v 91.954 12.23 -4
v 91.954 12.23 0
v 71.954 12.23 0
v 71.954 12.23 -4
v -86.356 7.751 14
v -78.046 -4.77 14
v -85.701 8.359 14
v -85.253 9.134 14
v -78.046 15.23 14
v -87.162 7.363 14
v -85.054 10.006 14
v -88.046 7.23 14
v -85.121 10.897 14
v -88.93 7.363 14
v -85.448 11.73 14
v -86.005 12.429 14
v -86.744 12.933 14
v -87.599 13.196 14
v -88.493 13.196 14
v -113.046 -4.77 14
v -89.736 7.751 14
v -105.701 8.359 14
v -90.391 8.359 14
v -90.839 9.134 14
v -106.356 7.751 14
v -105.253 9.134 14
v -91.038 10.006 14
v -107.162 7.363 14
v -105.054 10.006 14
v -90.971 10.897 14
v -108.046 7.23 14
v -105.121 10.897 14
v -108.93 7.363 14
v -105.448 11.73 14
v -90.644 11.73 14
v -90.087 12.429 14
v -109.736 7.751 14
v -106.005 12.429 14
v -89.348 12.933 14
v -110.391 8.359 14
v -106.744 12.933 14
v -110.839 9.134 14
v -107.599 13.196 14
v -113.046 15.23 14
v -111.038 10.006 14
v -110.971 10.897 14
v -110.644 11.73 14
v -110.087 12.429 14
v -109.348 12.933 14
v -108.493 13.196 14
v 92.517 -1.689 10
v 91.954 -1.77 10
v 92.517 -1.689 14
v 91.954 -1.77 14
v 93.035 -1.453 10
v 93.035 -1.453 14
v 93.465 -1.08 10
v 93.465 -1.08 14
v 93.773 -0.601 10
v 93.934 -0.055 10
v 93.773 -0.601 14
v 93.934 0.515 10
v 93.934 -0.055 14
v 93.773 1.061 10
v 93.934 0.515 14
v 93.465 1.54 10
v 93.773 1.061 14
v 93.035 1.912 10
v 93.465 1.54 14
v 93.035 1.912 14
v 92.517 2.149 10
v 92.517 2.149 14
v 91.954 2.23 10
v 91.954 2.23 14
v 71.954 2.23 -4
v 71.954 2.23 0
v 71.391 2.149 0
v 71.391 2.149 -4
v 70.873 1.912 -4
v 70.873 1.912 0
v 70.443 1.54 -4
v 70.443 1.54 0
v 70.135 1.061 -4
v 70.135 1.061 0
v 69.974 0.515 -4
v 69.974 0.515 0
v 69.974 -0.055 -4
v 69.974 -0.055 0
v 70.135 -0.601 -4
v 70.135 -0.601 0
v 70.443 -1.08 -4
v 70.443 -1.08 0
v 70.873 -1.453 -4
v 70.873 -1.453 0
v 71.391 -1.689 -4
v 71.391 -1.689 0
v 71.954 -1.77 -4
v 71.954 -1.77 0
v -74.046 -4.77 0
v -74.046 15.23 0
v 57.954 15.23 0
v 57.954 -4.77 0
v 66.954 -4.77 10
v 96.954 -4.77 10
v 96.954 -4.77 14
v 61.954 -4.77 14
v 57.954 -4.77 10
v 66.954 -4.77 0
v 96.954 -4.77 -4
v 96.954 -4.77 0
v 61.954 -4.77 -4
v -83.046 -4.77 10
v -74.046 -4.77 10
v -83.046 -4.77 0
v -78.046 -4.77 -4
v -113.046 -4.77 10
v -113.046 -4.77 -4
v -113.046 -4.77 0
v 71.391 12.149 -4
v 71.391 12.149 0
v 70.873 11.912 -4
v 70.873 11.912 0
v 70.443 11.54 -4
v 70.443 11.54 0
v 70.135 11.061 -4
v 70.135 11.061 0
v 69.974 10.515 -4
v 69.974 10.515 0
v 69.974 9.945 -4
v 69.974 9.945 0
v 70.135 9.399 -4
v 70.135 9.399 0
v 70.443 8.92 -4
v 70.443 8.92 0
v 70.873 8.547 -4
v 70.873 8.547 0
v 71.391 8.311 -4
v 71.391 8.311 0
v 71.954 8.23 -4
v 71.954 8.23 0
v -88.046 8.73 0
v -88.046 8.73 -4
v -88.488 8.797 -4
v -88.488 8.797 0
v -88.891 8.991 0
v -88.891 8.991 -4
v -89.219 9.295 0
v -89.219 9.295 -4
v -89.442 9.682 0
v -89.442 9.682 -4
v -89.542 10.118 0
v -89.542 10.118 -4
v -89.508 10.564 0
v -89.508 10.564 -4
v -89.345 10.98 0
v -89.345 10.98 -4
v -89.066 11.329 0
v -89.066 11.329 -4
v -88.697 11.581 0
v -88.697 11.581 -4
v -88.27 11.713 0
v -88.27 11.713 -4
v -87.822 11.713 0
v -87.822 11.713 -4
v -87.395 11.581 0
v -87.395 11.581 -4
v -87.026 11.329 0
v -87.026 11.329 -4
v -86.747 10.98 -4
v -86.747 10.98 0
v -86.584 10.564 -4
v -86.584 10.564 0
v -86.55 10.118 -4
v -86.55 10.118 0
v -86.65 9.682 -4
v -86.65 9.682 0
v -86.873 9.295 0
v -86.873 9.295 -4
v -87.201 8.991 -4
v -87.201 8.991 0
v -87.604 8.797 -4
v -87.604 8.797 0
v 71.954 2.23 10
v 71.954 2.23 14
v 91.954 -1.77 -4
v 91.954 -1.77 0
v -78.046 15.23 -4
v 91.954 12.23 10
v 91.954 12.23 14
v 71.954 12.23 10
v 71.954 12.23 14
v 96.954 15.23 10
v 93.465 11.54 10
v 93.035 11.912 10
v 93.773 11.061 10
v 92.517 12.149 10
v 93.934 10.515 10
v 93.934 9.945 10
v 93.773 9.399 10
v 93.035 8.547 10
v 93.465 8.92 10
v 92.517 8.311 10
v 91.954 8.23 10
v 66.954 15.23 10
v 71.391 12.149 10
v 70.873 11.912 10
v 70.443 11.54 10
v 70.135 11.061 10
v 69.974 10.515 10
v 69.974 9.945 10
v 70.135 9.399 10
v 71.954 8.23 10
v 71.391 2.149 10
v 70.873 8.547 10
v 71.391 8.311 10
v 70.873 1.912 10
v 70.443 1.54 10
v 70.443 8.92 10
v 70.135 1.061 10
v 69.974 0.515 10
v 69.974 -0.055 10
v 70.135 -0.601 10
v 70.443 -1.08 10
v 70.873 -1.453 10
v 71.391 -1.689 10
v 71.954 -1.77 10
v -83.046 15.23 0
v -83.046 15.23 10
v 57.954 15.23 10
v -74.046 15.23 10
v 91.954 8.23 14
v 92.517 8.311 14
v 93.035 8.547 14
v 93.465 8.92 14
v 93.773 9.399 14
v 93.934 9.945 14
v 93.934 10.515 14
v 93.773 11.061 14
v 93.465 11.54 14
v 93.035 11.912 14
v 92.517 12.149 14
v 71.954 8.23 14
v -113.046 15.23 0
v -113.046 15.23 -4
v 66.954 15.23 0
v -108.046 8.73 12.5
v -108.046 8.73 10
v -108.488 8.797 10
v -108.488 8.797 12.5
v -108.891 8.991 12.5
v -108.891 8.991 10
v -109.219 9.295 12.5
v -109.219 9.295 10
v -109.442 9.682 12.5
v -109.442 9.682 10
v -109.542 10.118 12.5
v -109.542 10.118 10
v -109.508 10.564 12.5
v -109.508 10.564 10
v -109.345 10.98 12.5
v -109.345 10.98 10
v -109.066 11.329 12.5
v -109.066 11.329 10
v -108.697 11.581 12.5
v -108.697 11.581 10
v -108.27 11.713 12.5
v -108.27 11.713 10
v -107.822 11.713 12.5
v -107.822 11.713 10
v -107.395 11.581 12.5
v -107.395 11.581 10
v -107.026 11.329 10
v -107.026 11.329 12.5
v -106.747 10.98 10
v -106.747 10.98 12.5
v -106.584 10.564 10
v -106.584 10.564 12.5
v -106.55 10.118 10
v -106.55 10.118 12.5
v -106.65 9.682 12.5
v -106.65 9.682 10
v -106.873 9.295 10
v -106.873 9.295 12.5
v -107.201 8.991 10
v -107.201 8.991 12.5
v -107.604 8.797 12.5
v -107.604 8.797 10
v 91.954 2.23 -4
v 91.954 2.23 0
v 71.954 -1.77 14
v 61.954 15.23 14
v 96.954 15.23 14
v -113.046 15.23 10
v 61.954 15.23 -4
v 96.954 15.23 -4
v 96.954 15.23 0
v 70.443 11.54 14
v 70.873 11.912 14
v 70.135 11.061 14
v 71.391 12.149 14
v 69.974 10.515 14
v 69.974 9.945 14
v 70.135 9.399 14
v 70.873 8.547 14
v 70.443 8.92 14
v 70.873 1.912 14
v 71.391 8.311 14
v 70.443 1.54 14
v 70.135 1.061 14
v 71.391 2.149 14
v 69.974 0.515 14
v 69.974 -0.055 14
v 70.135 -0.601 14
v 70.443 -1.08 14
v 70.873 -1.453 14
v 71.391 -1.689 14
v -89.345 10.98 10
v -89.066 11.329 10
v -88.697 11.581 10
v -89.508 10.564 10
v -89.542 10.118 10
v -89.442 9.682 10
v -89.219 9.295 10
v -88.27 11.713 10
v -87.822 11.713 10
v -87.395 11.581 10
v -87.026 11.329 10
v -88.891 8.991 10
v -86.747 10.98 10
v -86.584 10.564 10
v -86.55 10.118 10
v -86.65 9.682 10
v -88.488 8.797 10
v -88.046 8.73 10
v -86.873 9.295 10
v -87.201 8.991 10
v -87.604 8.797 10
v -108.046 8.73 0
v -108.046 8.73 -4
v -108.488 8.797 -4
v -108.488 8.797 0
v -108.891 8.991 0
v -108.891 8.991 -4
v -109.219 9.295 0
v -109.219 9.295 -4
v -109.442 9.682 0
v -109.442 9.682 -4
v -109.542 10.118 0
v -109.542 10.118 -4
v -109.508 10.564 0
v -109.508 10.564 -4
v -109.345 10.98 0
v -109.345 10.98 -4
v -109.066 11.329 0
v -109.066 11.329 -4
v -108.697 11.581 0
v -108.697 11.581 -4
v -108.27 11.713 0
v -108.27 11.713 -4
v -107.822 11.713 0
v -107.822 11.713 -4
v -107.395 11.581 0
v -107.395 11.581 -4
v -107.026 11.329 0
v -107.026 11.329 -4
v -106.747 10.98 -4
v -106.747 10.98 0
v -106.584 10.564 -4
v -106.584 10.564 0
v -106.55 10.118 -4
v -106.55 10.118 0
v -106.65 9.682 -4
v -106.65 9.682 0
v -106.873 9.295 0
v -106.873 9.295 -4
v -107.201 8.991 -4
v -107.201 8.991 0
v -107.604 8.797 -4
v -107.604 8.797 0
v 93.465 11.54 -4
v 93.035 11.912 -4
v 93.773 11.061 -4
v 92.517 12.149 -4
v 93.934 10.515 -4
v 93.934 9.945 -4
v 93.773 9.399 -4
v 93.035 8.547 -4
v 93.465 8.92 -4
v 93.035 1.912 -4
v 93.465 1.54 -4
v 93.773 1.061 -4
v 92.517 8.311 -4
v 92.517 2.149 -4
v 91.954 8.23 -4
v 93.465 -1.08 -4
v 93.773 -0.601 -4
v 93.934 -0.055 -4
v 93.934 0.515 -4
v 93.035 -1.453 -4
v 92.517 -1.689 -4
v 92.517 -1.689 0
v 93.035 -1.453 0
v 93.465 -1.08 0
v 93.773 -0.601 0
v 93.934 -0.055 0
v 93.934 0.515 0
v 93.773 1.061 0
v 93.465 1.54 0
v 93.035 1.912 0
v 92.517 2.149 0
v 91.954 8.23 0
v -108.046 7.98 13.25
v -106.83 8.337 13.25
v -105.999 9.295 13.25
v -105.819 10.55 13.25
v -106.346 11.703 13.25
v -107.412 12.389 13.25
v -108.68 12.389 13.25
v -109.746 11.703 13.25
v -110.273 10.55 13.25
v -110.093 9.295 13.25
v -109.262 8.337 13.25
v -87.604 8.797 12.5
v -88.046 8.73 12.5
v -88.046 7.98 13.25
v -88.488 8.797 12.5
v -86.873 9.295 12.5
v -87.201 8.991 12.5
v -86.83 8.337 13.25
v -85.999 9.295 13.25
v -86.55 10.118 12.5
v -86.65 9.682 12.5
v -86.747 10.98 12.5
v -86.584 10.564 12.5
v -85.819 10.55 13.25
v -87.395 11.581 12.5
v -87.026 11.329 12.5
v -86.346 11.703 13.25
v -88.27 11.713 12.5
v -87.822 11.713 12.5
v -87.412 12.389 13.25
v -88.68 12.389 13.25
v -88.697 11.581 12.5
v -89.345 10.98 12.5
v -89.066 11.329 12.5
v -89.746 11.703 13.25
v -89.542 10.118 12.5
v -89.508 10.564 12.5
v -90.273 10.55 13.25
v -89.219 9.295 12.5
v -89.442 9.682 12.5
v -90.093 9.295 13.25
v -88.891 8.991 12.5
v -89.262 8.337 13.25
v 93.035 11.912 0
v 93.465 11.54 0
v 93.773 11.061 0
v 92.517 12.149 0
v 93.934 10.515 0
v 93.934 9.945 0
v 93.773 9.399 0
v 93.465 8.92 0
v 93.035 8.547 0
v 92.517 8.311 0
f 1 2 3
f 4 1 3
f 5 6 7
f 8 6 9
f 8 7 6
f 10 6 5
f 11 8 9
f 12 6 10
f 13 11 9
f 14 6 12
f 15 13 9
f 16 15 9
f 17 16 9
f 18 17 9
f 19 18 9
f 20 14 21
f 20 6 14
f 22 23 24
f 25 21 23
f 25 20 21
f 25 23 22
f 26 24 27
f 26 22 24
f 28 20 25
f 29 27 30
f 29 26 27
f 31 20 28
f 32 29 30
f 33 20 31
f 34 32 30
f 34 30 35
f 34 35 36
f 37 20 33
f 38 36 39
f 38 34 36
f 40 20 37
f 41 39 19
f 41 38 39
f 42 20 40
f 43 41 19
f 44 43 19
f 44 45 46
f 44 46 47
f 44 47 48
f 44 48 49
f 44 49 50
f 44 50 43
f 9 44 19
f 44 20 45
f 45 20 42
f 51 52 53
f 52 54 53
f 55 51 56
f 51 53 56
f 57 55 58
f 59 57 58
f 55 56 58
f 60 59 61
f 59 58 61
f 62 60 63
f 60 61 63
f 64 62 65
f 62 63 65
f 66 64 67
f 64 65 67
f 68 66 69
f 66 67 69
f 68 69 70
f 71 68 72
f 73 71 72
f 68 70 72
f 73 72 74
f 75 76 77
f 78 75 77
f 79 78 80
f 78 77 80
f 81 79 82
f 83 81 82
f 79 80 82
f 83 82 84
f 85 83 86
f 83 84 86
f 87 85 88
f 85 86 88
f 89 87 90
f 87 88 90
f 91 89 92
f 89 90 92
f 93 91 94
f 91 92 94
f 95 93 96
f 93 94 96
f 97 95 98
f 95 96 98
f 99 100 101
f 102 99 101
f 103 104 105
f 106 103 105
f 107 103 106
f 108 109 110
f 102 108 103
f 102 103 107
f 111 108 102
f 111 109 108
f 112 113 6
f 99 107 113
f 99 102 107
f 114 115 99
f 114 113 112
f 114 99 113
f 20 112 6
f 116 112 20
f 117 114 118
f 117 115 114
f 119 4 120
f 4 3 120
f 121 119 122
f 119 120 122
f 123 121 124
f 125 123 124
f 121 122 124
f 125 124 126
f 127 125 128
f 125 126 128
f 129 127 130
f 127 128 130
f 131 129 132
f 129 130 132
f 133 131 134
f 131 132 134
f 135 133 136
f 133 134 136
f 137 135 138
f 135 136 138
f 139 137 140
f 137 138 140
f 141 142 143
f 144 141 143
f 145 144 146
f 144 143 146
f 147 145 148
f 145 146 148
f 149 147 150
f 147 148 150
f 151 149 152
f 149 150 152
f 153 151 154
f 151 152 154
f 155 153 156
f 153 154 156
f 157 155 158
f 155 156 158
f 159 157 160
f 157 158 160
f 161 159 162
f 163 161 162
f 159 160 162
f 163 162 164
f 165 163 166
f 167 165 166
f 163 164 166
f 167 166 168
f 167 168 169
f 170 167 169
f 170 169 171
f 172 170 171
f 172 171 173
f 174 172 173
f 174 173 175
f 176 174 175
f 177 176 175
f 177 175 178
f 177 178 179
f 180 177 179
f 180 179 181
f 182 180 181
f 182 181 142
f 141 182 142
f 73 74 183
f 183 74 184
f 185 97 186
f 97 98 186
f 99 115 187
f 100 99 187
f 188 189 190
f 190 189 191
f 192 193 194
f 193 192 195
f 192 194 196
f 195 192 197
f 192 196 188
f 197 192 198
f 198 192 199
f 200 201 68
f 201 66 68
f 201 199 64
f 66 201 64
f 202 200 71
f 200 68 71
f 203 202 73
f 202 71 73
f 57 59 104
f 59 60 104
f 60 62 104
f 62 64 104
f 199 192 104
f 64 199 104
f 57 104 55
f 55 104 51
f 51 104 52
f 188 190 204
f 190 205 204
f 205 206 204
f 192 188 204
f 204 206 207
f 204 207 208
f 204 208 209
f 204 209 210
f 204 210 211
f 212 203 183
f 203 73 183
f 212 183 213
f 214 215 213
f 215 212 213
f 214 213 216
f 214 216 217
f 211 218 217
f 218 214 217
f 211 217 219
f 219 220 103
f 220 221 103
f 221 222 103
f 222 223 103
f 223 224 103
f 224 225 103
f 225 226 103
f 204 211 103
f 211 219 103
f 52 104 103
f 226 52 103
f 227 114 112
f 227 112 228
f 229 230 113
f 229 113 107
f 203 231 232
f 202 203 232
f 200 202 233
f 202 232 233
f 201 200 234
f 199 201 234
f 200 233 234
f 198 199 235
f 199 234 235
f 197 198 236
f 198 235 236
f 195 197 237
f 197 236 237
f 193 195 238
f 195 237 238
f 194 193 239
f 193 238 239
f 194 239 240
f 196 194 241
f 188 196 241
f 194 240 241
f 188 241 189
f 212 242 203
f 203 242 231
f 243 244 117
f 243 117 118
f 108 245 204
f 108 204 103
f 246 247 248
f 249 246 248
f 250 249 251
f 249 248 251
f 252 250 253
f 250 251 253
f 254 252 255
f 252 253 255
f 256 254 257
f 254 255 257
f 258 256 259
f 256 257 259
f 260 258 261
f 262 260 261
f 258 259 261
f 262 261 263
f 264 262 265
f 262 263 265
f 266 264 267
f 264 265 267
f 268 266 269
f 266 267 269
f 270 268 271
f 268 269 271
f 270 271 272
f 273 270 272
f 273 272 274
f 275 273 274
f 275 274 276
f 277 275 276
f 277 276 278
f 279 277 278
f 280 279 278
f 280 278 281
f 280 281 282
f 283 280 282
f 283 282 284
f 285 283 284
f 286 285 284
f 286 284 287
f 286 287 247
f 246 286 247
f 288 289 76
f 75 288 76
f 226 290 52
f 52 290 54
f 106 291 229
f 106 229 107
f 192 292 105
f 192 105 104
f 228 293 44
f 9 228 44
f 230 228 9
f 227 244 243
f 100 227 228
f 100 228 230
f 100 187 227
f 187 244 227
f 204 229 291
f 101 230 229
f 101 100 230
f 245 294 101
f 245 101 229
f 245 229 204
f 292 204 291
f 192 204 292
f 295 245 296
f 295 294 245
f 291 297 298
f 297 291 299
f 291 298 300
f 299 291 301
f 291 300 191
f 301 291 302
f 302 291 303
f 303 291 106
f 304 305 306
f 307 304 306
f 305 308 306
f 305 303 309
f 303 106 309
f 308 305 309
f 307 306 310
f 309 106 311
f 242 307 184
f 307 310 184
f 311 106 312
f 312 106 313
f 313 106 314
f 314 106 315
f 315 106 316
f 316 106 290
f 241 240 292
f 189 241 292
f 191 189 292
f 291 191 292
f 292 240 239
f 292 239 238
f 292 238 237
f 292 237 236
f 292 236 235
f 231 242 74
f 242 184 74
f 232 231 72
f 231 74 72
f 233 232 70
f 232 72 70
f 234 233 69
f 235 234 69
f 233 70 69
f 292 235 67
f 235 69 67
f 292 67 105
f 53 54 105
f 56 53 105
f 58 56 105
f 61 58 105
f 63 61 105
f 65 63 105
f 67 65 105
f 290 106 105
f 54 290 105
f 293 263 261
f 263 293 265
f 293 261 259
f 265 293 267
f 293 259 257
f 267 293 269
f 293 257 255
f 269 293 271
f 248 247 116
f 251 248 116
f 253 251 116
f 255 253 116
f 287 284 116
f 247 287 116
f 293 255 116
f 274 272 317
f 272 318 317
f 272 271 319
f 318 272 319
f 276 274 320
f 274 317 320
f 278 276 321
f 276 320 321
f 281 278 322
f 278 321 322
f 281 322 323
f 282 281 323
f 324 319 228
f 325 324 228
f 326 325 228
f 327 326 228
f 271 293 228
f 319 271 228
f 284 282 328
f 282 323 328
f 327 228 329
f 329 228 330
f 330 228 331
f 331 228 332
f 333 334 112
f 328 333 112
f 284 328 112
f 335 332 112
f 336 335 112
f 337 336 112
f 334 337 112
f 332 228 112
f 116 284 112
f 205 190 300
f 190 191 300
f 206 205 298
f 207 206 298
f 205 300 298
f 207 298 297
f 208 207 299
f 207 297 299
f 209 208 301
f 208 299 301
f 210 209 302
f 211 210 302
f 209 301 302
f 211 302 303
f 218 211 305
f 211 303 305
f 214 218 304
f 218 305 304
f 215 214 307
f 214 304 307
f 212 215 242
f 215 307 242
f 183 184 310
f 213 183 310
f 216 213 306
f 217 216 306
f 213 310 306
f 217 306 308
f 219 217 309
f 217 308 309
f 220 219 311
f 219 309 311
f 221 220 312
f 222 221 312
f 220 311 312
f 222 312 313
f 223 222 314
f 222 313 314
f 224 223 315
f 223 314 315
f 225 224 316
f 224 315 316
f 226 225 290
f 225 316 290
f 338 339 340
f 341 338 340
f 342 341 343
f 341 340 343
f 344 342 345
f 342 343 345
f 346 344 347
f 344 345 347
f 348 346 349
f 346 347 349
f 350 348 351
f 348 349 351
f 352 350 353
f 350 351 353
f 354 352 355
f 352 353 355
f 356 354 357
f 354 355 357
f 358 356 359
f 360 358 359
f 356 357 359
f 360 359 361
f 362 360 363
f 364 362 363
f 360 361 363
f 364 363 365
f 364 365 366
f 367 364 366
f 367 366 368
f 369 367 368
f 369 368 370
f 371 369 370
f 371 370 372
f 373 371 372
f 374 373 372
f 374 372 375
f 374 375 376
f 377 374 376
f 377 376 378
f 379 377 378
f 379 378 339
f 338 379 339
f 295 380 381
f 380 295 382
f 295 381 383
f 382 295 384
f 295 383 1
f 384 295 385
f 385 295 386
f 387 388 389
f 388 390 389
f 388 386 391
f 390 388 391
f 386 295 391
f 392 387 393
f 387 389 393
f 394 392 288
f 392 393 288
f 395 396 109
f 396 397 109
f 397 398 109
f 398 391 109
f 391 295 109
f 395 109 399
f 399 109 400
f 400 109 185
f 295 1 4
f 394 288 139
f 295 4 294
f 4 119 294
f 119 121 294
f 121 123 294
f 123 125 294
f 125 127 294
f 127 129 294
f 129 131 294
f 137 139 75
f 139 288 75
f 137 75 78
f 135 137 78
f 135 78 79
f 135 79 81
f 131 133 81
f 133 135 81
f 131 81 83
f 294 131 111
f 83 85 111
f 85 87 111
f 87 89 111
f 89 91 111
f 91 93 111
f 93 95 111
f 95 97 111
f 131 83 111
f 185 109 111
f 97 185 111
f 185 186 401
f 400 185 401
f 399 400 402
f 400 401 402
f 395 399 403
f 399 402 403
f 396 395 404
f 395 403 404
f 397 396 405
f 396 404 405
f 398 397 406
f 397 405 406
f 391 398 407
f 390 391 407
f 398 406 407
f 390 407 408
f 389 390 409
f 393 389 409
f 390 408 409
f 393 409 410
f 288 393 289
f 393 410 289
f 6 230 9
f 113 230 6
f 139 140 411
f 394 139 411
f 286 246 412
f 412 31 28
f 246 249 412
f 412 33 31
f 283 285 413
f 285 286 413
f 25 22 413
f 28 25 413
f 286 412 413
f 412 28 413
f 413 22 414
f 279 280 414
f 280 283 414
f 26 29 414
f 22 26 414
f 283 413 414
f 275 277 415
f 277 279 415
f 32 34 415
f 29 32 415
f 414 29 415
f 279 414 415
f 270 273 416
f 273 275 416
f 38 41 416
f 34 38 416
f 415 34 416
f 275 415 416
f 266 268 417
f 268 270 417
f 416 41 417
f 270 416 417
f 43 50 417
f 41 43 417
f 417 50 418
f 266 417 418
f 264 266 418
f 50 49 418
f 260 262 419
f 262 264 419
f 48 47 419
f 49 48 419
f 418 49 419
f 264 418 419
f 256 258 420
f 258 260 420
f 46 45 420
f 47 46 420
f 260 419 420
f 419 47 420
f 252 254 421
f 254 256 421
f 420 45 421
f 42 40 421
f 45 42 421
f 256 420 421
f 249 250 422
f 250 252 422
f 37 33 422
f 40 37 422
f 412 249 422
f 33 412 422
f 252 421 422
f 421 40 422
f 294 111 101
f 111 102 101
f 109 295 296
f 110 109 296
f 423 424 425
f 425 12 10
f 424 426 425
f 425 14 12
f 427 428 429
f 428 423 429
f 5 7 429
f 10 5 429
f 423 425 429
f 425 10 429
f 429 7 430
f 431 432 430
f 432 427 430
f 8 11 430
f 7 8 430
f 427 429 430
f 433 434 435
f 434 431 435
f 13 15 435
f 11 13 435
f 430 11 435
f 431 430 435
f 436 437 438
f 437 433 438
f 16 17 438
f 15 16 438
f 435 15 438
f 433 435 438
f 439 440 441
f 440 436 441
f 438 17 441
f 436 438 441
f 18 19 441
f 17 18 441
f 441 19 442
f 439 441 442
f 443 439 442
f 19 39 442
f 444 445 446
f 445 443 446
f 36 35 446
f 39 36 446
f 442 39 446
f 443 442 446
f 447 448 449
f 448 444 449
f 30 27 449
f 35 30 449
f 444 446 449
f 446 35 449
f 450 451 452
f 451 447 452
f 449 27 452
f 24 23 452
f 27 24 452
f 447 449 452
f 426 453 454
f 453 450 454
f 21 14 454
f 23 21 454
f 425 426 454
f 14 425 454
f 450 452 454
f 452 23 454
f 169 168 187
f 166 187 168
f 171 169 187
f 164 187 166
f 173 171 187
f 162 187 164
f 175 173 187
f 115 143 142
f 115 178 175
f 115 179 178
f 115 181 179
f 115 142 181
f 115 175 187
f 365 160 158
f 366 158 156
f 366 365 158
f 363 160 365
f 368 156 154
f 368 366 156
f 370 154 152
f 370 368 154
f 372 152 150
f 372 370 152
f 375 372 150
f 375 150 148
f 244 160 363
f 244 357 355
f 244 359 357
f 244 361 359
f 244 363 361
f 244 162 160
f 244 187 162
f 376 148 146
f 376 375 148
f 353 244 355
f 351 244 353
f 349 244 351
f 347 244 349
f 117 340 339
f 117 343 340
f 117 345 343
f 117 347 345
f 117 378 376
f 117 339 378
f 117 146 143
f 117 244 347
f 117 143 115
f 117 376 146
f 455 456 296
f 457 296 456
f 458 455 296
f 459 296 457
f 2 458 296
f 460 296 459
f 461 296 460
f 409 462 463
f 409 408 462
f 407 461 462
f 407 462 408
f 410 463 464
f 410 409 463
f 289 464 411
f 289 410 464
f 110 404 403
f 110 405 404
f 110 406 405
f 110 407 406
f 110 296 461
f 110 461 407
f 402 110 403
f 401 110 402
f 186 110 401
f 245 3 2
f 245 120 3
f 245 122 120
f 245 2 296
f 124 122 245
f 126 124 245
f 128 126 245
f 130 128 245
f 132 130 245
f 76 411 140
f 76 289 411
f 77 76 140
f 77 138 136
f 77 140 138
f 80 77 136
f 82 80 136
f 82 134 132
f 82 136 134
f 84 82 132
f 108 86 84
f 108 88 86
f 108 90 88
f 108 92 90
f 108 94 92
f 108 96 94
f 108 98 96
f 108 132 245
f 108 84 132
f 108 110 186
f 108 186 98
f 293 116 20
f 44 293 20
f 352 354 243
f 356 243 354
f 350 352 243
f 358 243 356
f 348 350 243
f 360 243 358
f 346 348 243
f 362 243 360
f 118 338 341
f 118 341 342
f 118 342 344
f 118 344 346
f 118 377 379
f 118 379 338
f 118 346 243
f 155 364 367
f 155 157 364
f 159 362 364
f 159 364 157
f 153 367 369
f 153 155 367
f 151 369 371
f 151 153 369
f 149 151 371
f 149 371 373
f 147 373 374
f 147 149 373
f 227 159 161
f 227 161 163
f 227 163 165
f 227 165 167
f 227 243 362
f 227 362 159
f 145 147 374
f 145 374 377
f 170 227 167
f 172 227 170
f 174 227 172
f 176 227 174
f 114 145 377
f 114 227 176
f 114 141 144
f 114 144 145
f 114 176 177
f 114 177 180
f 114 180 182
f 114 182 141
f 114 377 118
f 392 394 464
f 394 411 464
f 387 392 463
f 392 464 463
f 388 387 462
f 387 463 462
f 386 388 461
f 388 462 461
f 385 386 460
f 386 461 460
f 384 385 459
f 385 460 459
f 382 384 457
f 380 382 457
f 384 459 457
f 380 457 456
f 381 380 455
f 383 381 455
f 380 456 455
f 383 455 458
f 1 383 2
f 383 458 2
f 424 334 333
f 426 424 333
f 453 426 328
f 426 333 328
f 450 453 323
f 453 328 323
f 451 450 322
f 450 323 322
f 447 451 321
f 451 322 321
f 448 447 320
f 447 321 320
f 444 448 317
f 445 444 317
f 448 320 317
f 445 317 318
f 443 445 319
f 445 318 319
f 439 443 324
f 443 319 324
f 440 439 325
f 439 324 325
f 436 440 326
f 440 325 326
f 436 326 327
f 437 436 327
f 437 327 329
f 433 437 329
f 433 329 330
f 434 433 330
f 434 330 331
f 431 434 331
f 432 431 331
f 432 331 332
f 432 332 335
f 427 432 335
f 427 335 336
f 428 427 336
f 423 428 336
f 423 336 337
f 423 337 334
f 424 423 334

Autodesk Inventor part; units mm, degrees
ref_plane "YZ Plane" through (0, 0, 0) normal (1, 0, 0) x (0, 1, 0)
ref_plane "XZ Plane" through (0, 0, 0) normal (0, 1, 0) x (-1, 0, 0)
ref_plane "XY Plane" through (0, 0, 0) normal (0, 0, 1) x (1, 0, 0)
sketch "Sketch1" plane through (0, 0, 0) normal (0, 0, 1) x (1, 0, 0)
  line L0 (-83.046, 15.2299) -> (66.954, 15.2299)
  line L1 (66.954, 15.2299) -> (66.954, -4.7701)
  line L2 (66.954, -4.7701) -> (-83.046, -4.7701)
  line L3 (-83.046, -4.7701) -> (-83.046, 15.2299)
  point P0 (0, 0)
  dimension "d0" = 150
  dimension "d1" = 20
extrude "Extrusion1" add sketch "Sketch1" along normal blind 10
sketch "Sketch2" plane through (-83.046, -4.7701, 0) normal (-1, 0, 0) x (0, 0, 1)
  point P0 (0, 4.7701)
sketch "Sketch3" plane through (-83.046, -4.7701, 0) normal (-1, 0, 0) x (0, 0, 1)
  line L0 (0, 20) -> (-4, 20)
  line L1 (-4, 20) -> (-4, 0)
  line L2 (-4, 0) -> (0, 0)
  line L3 (0, 0) -> (0, 20)
  line L4 (10, 0) -> (14, 0)
  line L5 (14, 0) -> (14, 20)
  line L6 (14, 20) -> (10, 20)
  line L7 (10, 20) -> (10, 0)
  line L8 (0, 0) -> (10, 0) projected
  line L9 (10, 20) -> (10, 0) projected
  point P0 (0, 4.7701)
  dimension "d4" = 4
  dimension "d5" = 4
extrude "Extrusion2" add sketch "Sketch3" against normal blind 5
sketch "Sketch4" plane through (-83.046, -4.7701, 14) normal (-1, 0, 0) x (0, 0, 1)
  line L0 (-18, 20) -> (-14, 20)
  line L1 (-14, 20) -> (-14, 0)
  line L2 (-14, 0) -> (-18, 0)
  line L3 (-18, 0) -> (-18, 20)
  line L4 (0, 20) -> (-4, 20)
  line L5 (-4, 20) -> (-4, 0)
  line L6 (-4, 0) -> (0, 0)
  line L7 (0, 0) -> (0, 20)
  point P0 (-14, 4.7701)
extrude "Extrusion3" add sketch "Sketch4" along normal blind 30
sketch "Sketch5" plane through (-78.046, -4.7701, 14) normal (0, 0, 1) x (1, 0, 0)
  line L0 (-35, 0) -> (-35, 20) projected
  line L1 (-5, 20) -> (-35, 20) projected
  line L2 (-5, 0) -> (-5, 20) projected
  point P0 (78.046, 4.7701)
  point P1 (-30, 15)
  point P2 (-10, 15)
  dimension "d10" = 5
  dimension "d11" = 5
  dimension "d12" = 5
  dimension "d13" = 5
hole "Hole1" at (-108.046, 10.2299, 14) at (-88.046, 10.2299, 14) direction (0, 0, -1) diameter 3 depth 30 tip angle 118 countersink diameter 6 countersink angle 90
chamfer "Chamfer1" distance 4 angle 45 2 edges at (-78.046, 5.2299, 10) (-78.046, 5.2299, 0)
sketch "Sketch6" plane through (66.954, -4.7701, 0) normal (0, -1, 0) x (1, 0, 0)
  line L0 (0, -4) -> (-5, -4)
  line L1 (-5, -4) -> (-5, 14)
  line L2 (-5, 14) -> (0, 14)
  line L3 (0, 14) -> (0, -4)
  line L4 (0, 0) -> (-141, 0) projected
  line L5 (-141, 10) -> (0, 10) projected
  line L6 (0, 0) -> (0, 10) projected
  point P0 (-66.954, 0)
  dimension "d24" = 4
  dimension "d25" = 4
  dimension "d26" = 5
extrude "Extrusion4" add sketch "Sketch6" against normal blind 20
sketch "Sketch7" plane through (-113.046, -4.7701, 10) normal (0, -1, 0) x (1, 0, 0)
  line L0 (180, -14) -> (210, -14)
  line L1 (210, -14) -> (210, -10)
  line L2 (210, -10) -> (180, -10)
  line L3 (180, -10) -> (180, -14)
  line L4 (180, 4) -> (210, 4)
  line L5 (210, 4) -> (210, 0)
  line L6 (210, 0) -> (180, 0)
  line L7 (180, 0) -> (180, 4)
  point P0 (113.046, -10)
  dimension "d29" = 30
  dimension "d30" = 30
  dimension "d31" = 4
  dimension "d32" = 4
extrude "Extrusion5" add sketch "Sketch7" against normal blind 20
chamfer "Chamfer2" distance 4 angle 45 2 edges at (61.954, 5.2299, 10) (61.954, 5.2299, 0)
sketch "Sketch8" plane through (96.954, -4.7701, 14) normal (0, 0, 1) x (1, 0, 0)
  line L0 (-30, 20) -> (-30, 0) projected
  line L1 (0, 0) -> (0, 20) projected
  line L2 (-35, 20) -> (0, 20) projected
  line L3 (-35, 0) -> (0, 0) projected
  circle A0 centre (-25, 5) radius 2
  circle A1 centre (-25, 15) radius 2
  circle A2 centre (-5, 5) radius 2
  circle A3 centre (-5, 15) radius 2
  line L4 (-25, 3) -> (-5, 3)
  line L5 (-5, 7) -> (-25, 7)
  line L6 (-25, 13) -> (-5, 13)
  line L7 (-5, 17) -> (-25, 17)
  point P0 (-96.954, 4.7701)
  dimension "d38" = 5
  dimension "d39" = 5
  dimension "d40" = 5
  dimension "d41" = 5
  dimension "d42" = 5
  dimension "d43" = 5
  dimension "d44" = 5
  dimension "d45" = 5
  dimension "d46" = 4
  dimension "d47" = 4
  dimension "d48" = 4
  dimension "d49" = 4
extrude "Extrusion6" cut sketch "Sketch8" against normal blind 20 contours A0 | A0 L5 A2 L4 | A2 | A1 | A1 L7 A3 L6 | A3
properties part number "Upper Support beam"
